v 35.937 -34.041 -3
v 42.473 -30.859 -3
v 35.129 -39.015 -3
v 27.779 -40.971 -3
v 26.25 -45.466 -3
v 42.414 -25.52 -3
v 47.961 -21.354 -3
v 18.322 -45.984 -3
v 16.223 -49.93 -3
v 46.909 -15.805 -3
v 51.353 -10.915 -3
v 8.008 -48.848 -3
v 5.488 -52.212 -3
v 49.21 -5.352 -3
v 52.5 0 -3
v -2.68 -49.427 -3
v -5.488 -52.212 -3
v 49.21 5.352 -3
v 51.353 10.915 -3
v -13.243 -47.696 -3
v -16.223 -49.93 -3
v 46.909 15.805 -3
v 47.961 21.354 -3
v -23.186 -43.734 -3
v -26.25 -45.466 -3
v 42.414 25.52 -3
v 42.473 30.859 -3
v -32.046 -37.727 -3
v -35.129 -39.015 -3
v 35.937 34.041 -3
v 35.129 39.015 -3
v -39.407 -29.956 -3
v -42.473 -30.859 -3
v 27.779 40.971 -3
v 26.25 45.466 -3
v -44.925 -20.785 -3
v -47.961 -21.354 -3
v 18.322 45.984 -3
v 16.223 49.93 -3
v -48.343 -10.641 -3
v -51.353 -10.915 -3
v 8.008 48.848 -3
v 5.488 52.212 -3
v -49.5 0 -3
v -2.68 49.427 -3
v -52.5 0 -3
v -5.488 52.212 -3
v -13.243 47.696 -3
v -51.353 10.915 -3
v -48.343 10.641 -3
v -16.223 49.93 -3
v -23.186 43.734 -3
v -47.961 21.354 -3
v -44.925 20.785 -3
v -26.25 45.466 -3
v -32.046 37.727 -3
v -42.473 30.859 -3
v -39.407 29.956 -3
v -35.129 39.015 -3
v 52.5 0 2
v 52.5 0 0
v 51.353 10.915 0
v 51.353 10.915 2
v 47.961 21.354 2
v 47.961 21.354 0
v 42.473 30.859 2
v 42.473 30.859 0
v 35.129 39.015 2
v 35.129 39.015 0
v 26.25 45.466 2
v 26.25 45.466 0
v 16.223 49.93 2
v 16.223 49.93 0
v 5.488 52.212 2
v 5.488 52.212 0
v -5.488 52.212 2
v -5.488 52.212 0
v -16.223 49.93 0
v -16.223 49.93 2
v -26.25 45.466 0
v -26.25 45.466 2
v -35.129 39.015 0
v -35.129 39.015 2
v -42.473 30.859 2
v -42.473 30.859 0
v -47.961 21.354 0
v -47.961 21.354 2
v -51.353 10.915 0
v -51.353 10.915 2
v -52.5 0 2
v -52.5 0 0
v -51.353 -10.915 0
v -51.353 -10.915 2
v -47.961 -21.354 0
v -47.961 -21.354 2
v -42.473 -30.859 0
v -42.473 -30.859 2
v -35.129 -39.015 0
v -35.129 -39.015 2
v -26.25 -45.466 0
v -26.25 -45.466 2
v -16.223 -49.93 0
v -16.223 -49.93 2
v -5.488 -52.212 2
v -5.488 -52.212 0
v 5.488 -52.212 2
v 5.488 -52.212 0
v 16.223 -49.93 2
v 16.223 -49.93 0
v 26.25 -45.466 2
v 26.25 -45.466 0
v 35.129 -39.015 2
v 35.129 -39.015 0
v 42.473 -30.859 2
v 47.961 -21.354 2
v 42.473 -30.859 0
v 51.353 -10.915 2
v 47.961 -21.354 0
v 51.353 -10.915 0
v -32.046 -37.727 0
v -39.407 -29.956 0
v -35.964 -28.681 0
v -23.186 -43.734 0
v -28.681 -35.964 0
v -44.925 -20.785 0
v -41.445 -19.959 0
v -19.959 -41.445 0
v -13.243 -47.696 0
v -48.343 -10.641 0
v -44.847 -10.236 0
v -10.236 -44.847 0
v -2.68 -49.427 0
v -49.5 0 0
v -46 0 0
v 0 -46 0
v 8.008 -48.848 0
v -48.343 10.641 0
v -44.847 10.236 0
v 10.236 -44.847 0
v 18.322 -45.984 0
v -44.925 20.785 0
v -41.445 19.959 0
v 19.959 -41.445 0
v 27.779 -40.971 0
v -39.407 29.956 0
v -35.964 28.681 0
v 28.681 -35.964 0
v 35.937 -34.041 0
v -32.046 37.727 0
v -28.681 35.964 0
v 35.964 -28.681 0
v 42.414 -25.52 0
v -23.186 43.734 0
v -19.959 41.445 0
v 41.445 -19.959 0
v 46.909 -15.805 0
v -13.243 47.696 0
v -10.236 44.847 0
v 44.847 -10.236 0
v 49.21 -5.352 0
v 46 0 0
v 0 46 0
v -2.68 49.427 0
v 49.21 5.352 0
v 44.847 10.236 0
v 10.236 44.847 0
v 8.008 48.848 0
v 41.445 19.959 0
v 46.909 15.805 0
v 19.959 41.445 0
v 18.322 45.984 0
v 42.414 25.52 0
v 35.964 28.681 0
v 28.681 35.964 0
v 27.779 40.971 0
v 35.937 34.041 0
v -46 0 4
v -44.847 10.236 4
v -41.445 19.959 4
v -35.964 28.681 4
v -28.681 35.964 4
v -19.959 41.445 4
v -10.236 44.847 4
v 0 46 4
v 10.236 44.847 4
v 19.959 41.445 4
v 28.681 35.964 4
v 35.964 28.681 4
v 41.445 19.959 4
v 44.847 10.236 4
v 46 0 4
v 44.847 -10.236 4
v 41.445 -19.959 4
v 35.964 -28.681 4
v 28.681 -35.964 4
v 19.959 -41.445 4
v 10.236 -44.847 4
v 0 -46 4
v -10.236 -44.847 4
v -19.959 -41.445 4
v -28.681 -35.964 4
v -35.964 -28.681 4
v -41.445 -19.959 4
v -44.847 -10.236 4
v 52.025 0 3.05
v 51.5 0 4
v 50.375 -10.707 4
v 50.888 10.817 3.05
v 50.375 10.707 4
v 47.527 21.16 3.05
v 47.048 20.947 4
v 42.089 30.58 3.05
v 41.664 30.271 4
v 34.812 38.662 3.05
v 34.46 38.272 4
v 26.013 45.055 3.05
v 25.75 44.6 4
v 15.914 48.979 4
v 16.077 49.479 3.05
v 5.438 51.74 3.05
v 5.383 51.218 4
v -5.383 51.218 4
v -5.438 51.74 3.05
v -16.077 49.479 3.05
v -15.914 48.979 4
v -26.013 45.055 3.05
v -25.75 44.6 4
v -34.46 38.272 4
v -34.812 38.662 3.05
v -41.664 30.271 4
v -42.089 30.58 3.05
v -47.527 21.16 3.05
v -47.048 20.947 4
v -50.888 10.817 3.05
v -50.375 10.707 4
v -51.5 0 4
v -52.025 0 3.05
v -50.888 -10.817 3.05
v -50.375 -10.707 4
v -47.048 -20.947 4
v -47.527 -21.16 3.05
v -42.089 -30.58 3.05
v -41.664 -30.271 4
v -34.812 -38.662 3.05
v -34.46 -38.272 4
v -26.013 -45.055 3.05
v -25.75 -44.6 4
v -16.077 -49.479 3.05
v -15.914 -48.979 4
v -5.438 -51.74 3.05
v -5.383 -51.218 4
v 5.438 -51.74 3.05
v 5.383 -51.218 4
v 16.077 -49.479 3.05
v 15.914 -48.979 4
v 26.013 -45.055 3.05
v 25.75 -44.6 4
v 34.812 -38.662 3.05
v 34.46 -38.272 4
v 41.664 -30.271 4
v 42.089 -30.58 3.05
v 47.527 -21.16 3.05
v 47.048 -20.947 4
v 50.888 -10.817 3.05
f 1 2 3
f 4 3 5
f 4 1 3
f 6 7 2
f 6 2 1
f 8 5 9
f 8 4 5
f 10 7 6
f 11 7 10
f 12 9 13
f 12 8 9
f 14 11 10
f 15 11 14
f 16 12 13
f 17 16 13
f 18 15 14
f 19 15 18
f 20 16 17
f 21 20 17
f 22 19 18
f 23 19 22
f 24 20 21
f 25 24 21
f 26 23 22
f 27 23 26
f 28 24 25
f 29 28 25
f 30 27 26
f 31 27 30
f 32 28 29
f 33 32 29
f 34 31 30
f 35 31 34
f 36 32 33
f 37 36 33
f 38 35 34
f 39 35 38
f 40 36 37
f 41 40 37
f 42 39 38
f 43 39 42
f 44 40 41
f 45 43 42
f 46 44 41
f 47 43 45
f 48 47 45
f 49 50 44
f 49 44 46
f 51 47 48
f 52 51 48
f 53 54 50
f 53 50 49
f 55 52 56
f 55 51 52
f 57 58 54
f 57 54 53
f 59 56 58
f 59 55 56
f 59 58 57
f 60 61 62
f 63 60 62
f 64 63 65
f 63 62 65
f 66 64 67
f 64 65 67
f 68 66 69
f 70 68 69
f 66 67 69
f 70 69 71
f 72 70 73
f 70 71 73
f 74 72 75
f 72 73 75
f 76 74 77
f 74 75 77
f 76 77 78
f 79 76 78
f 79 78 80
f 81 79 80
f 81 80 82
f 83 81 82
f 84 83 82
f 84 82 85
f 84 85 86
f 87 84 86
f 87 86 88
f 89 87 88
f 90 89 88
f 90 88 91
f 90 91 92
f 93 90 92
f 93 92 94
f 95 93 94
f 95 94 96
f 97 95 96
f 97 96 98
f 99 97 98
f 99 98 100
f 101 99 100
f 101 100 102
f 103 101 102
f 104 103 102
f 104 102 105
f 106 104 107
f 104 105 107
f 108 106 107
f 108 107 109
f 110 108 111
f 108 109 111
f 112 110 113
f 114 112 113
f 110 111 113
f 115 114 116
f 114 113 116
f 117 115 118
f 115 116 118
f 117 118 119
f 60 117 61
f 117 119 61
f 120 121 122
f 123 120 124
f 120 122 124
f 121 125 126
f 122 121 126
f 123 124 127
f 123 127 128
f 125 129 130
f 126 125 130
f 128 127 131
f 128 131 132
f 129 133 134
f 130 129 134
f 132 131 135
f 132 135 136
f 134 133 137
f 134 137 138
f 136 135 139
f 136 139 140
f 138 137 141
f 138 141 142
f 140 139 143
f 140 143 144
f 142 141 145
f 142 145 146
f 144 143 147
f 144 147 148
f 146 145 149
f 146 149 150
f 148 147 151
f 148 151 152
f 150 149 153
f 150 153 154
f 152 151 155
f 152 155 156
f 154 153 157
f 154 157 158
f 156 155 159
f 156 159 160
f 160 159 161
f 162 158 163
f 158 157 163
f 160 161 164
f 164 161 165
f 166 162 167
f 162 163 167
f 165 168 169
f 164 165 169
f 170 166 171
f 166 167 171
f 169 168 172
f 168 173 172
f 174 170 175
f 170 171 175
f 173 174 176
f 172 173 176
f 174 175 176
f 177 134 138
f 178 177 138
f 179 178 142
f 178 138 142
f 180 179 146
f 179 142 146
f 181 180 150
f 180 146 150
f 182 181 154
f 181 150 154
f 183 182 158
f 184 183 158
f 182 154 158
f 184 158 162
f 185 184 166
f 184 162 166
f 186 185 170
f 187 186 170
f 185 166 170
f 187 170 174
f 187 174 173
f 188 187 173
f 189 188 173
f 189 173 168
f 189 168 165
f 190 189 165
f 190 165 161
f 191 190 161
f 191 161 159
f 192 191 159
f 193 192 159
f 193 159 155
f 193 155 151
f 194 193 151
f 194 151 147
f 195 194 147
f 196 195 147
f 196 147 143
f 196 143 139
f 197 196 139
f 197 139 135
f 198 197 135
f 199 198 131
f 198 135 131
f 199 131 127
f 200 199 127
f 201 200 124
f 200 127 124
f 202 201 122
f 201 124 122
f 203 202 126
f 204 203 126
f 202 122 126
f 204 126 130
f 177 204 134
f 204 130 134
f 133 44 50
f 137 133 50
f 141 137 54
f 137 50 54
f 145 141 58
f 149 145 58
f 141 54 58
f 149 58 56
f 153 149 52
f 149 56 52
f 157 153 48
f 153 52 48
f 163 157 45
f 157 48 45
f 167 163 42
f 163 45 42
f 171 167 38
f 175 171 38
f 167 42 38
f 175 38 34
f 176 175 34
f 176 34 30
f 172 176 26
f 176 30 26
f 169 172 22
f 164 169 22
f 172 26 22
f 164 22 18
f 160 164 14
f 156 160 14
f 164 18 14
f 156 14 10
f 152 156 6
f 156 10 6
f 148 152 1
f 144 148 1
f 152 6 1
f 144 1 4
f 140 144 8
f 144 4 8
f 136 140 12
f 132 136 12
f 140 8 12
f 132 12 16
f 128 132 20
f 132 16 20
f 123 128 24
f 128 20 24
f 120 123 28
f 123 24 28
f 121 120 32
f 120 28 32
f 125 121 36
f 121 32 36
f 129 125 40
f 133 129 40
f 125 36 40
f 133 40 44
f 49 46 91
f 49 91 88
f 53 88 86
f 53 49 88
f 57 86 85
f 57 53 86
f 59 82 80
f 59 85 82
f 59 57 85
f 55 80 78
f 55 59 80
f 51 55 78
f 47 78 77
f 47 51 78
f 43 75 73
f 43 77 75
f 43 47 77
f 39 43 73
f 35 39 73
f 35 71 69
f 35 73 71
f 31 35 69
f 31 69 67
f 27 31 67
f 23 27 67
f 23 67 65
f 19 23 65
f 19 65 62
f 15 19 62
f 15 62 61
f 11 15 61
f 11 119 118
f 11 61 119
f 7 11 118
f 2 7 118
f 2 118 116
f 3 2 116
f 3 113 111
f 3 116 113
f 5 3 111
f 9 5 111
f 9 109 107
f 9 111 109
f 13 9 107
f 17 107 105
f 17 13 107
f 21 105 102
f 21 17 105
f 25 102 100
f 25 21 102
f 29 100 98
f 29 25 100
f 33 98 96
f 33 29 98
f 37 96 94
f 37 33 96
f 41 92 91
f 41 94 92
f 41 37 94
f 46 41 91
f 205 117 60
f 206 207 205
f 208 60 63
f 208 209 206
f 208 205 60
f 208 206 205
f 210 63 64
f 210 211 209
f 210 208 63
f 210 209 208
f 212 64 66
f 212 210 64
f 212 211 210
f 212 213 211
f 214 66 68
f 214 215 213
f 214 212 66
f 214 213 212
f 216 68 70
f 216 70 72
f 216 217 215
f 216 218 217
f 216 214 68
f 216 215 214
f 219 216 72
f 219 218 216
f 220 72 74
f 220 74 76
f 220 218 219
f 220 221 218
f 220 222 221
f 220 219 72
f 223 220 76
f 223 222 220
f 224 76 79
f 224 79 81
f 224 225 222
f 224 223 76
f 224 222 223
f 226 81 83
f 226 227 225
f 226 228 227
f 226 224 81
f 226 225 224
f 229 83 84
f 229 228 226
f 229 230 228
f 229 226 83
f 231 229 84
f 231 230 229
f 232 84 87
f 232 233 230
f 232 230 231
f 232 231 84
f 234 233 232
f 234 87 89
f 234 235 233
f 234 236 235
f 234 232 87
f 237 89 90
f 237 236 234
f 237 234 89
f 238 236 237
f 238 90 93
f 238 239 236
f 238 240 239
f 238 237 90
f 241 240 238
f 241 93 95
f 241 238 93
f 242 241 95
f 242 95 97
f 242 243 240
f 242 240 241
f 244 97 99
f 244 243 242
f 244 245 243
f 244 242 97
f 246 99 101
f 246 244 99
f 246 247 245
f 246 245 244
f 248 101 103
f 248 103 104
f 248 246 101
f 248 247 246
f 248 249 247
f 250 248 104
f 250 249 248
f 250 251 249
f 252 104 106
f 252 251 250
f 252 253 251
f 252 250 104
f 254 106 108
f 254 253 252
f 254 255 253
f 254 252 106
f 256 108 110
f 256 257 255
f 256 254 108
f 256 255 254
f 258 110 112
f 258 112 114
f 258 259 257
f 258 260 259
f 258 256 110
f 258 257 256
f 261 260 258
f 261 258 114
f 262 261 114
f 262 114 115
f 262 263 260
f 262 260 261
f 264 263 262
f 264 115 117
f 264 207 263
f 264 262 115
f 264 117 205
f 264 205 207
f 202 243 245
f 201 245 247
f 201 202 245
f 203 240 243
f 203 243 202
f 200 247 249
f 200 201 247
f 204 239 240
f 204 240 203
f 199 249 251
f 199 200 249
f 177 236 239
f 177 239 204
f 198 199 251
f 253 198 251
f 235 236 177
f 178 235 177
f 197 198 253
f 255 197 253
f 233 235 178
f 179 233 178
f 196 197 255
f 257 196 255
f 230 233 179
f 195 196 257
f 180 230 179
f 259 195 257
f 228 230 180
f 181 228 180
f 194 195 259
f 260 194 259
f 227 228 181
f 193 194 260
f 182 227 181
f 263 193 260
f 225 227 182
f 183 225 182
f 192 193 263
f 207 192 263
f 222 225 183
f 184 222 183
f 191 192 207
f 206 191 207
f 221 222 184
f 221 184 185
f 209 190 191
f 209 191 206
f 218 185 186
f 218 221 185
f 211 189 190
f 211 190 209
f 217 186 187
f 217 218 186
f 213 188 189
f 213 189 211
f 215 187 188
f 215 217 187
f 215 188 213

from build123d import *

# Parameters (mm, degrees)
SKETCH3_R           = 52.5
BOSS_EXTRUDE2_DEPTH = 4
BOSS_EXTRUDE3_START = 3
SKETCH4_R           = 52.5
SKETCH4_R_2         = 49.5
BOSS_EXTRUDE3_DEPTH = 3
SKETCH5_R           = 46
CUT_EXTRUDE1_DEPTH  = 10
FILLET1_SIZE        = 2
FILLET1_SIZE_2      = 1


with BuildPart() as part:
    # Sketch3 → Boss-Extrude2 (new body)
    with BuildSketch(Plane.XY):
        Circle(SKETCH3_R)
    extrude(amount=BOSS_EXTRUDE2_DEPTH)

    # Sketch4 → Boss-Extrude3 (add)
    with BuildSketch(Plane(origin=(0, 0, 0), x_dir=(-1, 0, 0), z_dir=(0, 0, -1)).offset(BOSS_EXTRUDE3_START)):
        Circle(SKETCH4_R)
        Circle(SKETCH4_R_2, mode=Mode.SUBTRACT)
    extrude(amount=-BOSS_EXTRUDE3_DEPTH)

    # Sketch5 → Cut-Extrude1 (cut)
    with BuildSketch(Plane(origin=(0, 0, 0), x_dir=(-1, 0, 0), z_dir=(0, 0, -1))):
        Circle(SKETCH5_R)
    extrude(amount=-CUT_EXTRUDE1_DEPTH, mode=Mode.SUBTRACT)

    # Fillet1
    # a fillet whose section is not a circle: 2, 1 mm, written as the material it takes off along each edge
    with BuildSketch(Plane(origin=(0, 0, 4), x_dir=(1, 0, 0), z_dir=(0, -1, 0))) as fillet1_piece_1:
        with BuildLine():
            Bezier((52.5, -FILLET1_SIZE), (52.5, 0), (52.5 - FILLET1_SIZE_2, 0), weights=[1, 0.052631579, 1])
            Line((52.5 - FILLET1_SIZE_2, 0), (51.5, 0.04))
            Line((51.5, 0.04), (52.54, 0.04))
            Line((52.54, 0.04), (52.54, -2))
            Line((52.54, -2), (52.5, -FILLET1_SIZE))
        make_face()
    revolve(axis=Axis((0, 0, 4), (0, 0, 1)), mode=Mode.SUBTRACT)


solid = part.part
